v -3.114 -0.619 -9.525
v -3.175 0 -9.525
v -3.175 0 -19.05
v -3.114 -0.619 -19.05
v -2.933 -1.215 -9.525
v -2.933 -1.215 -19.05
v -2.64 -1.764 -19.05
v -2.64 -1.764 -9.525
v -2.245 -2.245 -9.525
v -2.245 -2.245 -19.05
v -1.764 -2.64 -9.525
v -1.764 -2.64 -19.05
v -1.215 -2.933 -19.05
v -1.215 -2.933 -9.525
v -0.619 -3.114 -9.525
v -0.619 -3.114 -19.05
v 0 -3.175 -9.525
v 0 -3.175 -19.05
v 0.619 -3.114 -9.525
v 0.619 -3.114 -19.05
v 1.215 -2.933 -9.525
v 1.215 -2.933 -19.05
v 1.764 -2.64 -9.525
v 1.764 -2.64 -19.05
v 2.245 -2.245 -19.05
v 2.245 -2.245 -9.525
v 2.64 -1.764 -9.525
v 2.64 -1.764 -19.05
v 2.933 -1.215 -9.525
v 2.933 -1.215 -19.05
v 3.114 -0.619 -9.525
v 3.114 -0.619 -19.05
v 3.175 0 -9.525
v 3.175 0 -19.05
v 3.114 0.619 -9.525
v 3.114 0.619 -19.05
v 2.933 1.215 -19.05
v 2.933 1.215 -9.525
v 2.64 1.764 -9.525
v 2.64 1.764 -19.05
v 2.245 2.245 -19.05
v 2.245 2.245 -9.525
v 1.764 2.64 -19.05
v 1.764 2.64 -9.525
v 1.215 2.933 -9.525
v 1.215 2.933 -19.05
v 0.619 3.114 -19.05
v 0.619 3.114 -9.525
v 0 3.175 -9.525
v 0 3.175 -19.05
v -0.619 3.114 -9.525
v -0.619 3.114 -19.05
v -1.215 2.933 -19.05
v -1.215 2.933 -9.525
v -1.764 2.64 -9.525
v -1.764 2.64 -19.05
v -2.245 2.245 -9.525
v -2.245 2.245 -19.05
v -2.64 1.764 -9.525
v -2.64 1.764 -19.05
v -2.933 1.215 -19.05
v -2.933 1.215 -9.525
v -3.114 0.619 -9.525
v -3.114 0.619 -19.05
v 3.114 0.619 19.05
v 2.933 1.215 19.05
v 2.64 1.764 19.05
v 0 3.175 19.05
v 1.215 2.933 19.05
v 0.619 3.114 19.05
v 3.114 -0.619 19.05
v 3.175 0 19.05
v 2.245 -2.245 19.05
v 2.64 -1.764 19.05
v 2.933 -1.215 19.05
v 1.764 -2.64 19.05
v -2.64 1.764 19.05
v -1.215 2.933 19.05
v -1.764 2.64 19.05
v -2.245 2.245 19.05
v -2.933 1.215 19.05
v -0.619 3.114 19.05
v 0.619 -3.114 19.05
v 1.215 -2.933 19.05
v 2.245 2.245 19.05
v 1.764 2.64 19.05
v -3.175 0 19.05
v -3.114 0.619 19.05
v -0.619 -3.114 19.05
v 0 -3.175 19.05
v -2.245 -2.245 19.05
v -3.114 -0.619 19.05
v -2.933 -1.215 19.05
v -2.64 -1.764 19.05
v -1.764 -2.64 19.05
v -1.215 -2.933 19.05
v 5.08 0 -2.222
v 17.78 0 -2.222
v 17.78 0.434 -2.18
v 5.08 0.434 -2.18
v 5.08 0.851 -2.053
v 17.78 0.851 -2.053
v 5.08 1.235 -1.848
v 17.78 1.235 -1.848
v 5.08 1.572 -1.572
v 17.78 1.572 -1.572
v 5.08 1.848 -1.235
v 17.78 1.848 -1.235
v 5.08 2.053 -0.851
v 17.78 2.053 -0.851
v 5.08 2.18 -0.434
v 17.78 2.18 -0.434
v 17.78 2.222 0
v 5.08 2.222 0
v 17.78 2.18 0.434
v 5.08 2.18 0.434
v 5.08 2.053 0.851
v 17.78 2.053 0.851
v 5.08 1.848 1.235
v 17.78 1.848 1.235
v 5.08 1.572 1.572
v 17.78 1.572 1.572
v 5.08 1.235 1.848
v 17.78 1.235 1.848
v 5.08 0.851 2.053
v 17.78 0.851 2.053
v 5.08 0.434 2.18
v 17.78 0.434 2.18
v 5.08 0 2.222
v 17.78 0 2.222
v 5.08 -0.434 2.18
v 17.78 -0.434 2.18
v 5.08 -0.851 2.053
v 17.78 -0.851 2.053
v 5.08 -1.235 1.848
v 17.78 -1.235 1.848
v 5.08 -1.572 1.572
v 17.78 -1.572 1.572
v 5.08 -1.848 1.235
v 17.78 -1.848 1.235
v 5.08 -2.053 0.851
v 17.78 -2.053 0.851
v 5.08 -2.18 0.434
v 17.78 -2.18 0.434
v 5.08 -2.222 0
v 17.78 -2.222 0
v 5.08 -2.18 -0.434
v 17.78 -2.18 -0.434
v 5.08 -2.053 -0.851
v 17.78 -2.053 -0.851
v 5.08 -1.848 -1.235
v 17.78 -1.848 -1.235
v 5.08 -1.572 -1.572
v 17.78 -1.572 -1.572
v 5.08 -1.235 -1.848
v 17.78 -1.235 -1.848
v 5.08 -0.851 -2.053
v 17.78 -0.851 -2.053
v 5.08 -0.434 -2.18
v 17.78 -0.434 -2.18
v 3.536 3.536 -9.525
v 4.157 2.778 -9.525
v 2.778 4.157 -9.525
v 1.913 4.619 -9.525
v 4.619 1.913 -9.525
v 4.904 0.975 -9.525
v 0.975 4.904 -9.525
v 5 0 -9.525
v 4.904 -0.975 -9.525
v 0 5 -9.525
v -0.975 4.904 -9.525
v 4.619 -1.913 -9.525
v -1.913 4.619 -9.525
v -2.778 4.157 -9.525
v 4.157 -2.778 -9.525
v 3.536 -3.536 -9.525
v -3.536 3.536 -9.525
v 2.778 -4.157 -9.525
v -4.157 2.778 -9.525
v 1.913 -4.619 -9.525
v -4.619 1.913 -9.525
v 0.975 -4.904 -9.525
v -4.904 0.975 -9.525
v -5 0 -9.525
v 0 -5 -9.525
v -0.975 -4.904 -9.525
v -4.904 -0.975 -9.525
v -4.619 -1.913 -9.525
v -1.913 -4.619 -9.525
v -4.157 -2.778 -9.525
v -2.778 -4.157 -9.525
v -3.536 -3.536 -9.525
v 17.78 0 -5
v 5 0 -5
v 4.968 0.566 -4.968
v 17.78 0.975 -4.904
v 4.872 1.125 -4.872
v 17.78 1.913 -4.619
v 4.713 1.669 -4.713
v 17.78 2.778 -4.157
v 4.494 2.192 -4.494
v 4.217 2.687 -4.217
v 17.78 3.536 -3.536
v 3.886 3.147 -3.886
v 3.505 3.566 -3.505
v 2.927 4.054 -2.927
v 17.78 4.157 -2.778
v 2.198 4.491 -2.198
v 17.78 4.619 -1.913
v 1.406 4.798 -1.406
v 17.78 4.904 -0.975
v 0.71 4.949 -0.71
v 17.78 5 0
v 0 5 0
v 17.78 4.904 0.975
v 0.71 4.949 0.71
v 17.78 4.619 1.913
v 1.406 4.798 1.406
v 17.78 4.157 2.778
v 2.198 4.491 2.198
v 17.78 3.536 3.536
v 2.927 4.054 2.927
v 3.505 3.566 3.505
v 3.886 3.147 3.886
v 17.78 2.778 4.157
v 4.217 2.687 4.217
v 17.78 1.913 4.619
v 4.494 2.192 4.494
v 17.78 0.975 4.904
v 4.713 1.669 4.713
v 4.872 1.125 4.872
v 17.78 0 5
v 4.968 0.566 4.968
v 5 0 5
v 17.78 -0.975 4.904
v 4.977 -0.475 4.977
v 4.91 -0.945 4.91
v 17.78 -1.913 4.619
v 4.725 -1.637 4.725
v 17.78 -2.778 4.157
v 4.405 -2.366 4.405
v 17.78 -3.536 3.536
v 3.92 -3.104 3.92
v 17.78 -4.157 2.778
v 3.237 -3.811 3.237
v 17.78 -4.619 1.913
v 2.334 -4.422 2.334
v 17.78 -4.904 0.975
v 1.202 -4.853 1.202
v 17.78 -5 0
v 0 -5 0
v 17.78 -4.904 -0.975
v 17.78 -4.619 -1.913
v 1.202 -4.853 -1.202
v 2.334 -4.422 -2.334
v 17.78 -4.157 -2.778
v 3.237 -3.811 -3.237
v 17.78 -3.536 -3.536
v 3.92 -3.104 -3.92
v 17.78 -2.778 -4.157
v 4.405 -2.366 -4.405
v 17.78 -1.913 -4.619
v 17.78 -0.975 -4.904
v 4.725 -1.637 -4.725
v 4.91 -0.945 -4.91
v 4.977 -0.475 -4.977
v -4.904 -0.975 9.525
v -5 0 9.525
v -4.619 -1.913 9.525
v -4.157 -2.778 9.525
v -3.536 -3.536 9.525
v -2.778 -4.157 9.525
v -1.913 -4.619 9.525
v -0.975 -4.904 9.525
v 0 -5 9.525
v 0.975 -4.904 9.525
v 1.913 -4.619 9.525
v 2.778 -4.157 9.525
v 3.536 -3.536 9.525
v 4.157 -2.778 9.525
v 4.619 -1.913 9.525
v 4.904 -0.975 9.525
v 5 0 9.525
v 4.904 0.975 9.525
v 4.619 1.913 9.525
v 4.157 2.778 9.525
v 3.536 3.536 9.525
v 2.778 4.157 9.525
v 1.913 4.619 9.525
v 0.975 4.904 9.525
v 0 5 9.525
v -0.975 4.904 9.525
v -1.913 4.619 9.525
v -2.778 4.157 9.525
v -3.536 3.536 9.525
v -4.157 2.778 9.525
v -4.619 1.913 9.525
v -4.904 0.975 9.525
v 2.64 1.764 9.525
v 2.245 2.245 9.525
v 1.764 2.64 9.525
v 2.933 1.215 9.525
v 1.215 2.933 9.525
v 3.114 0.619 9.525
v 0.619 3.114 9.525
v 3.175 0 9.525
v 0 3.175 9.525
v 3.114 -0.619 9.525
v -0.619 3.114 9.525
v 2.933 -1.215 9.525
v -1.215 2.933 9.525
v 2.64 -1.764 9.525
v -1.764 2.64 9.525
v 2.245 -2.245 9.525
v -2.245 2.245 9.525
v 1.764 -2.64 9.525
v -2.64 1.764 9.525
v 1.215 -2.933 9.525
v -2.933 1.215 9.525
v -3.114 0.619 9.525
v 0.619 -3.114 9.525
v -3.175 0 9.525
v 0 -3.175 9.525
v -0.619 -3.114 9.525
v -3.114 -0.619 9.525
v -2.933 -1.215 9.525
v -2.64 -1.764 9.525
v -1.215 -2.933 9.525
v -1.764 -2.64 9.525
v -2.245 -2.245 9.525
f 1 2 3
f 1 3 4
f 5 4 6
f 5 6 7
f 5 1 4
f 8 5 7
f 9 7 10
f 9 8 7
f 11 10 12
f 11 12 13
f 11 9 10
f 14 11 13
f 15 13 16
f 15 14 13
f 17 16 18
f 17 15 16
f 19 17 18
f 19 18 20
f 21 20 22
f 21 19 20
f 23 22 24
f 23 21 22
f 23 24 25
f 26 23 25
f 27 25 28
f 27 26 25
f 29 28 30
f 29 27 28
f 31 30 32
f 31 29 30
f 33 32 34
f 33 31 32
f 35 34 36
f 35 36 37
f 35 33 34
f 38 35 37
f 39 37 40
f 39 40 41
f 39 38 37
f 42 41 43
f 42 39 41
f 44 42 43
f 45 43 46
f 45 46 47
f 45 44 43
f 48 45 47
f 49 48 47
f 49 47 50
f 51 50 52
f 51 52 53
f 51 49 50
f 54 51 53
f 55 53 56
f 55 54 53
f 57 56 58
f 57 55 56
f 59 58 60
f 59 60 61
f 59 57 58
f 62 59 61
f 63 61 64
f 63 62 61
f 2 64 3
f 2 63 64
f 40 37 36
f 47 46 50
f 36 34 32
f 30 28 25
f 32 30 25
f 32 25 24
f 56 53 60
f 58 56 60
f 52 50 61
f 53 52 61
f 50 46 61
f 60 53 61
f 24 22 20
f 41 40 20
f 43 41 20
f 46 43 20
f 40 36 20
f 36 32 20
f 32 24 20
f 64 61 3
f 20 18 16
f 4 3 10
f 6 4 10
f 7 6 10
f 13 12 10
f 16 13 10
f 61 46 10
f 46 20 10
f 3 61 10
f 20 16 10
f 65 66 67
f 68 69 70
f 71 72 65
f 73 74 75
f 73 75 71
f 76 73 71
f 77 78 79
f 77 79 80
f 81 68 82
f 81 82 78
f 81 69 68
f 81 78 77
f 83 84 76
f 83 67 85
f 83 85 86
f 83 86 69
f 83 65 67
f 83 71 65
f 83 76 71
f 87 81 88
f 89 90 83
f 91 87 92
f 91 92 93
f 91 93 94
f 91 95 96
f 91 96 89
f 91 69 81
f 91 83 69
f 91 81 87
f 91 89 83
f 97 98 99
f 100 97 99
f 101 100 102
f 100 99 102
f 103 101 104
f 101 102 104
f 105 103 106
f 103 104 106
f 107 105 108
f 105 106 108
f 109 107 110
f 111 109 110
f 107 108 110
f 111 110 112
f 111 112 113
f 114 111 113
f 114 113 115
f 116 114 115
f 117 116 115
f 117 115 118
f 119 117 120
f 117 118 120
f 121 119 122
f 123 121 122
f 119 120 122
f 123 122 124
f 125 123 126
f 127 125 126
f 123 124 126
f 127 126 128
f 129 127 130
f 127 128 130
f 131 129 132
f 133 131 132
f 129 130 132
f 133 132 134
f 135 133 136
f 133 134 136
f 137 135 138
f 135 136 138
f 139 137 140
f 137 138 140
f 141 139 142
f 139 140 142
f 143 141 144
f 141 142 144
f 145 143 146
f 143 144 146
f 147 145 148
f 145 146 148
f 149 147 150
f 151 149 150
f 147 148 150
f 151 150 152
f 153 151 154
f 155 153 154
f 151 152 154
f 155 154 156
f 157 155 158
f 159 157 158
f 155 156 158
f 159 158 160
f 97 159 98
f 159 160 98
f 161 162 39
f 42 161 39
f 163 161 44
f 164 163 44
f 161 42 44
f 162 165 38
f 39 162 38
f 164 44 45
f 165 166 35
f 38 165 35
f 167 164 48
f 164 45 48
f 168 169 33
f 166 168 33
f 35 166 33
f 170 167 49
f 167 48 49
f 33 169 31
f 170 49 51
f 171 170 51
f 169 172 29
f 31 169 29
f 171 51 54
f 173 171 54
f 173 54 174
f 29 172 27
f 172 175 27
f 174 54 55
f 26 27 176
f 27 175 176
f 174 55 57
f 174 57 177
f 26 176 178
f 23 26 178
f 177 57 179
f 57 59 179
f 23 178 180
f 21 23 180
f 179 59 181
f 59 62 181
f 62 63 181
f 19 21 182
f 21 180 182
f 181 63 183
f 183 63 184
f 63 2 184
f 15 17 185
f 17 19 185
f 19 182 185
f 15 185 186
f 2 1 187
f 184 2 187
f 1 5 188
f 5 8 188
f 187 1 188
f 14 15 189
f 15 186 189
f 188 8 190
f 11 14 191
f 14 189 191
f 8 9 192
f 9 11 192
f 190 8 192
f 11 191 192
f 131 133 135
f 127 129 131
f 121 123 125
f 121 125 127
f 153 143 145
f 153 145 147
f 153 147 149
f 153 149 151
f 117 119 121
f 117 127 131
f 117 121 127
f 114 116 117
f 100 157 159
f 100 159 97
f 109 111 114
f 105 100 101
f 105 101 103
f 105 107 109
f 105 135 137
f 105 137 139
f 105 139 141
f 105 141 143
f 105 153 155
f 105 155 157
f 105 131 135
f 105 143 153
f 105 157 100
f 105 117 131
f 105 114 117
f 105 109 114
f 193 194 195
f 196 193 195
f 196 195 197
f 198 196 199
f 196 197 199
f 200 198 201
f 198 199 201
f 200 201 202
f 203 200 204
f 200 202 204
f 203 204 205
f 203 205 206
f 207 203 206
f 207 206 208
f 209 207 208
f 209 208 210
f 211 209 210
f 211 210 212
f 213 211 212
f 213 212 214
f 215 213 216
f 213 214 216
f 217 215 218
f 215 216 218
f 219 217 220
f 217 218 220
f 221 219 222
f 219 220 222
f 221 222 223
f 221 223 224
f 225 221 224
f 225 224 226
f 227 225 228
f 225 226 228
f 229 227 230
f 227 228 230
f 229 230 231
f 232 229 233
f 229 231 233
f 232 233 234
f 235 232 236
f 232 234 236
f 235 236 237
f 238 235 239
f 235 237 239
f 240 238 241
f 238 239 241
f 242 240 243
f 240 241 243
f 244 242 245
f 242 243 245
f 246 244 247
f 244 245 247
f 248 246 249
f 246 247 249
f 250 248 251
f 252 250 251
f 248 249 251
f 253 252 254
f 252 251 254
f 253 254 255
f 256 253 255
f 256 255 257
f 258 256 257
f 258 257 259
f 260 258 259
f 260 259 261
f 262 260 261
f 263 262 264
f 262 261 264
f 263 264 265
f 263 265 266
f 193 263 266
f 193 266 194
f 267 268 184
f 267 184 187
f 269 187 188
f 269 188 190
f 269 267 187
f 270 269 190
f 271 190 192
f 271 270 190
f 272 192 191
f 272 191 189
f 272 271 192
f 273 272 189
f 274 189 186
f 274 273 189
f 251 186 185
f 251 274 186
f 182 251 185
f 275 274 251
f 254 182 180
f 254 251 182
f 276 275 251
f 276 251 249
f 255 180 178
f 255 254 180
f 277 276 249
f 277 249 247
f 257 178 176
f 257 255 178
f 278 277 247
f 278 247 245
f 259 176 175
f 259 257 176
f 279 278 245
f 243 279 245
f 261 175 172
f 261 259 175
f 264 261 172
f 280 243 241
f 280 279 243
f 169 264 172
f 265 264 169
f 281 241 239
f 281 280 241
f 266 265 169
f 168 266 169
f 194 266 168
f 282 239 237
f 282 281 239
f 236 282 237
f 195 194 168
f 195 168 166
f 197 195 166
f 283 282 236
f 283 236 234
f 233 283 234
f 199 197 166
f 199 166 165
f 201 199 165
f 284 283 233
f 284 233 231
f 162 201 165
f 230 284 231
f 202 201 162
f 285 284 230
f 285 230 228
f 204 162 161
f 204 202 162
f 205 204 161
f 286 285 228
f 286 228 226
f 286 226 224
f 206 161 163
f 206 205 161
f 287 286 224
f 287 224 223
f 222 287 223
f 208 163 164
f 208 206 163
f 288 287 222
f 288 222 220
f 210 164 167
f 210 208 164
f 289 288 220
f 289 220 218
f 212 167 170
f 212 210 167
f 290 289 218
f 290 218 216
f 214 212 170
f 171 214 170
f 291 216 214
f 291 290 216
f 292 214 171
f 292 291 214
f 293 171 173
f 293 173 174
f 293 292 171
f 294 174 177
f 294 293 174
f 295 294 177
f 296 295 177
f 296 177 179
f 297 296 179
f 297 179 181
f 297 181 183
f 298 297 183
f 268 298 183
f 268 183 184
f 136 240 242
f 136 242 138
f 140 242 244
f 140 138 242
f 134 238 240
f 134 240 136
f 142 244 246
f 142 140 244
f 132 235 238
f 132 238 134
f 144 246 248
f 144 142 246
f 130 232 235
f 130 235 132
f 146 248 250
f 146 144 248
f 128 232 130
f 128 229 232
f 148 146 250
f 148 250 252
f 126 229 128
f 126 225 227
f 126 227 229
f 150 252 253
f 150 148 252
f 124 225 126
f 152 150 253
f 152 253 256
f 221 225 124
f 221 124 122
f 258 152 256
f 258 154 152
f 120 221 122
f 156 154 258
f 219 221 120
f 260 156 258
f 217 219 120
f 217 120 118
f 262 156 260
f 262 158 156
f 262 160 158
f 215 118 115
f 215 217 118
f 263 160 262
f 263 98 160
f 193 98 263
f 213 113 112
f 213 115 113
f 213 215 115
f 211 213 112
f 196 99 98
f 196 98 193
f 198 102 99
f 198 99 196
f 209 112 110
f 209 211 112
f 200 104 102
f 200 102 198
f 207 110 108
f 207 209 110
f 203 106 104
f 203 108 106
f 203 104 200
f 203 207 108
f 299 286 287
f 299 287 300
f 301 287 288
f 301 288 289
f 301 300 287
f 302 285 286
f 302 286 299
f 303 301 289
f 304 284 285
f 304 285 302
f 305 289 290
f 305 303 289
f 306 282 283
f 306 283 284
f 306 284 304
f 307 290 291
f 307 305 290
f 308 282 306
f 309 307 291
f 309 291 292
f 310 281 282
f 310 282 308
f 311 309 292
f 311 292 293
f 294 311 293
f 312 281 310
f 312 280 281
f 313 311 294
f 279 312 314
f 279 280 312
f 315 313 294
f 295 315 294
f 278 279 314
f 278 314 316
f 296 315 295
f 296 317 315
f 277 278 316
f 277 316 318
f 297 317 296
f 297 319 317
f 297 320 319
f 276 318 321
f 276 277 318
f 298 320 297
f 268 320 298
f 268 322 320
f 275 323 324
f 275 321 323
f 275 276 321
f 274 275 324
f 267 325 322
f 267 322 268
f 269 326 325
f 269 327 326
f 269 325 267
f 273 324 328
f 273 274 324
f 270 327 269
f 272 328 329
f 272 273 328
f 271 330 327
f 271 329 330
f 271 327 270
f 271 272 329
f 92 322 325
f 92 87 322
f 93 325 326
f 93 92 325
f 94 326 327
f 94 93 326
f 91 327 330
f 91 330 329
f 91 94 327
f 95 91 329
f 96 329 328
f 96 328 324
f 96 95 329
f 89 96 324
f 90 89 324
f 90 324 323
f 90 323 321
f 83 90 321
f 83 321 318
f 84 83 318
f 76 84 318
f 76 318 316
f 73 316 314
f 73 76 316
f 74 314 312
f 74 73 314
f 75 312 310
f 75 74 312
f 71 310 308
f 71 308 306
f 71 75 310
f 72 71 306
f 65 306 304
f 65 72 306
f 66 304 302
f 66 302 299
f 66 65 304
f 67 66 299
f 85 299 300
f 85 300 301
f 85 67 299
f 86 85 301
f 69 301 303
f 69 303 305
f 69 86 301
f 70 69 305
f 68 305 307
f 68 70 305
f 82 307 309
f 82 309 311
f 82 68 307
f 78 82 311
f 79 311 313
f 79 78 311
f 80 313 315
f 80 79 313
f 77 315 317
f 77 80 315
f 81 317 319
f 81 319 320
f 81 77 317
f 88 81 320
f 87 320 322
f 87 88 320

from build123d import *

# Parameters (mm, degrees)
SKETCH1_R           = 5
BOSS_EXTRUDE1_DEPTH = 9.525
SKETCH5_R           = 3.175
BOSS_EXTRUDE4_DEPTH = 19.05
SKETCH6_R           = 5
BOSS_EXTRUDE5_DEPTH = 17.78
SKETCH7_R           = 2.2225
CUT_EXTRUDE1_DEPTH  = 12.7


with BuildPart() as part:
    # Sketch1 → Boss-Extrude1 (new, symmetric)
    with BuildSketch(Plane.XY):
        with Locations(Location((0, 0, 0), (0, 0, 180))):
            Circle(SKETCH1_R)
    extrude(amount=BOSS_EXTRUDE1_DEPTH, both=True)

    # Sketch5 → Boss-Extrude4 (add, symmetric)
    with BuildSketch(Plane.XY):
        with Locations(Location((0, 0, 0), (0, 0, 180))):
            Circle(SKETCH5_R)
    extrude(amount=BOSS_EXTRUDE4_DEPTH, both=True)

    # Sketch6 → Boss-Extrude5 (add)
    with BuildSketch(Plane(origin=(0, 0, 0), x_dir=(0, 0, -1), z_dir=(1, 0, 0))):
        Circle(SKETCH6_R)
    extrude(amount=BOSS_EXTRUDE5_DEPTH)

    # Sketch7 → Cut-Extrude1 (cut)
    with BuildSketch(Plane(origin=(17.78, 0, 0), x_dir=(0, 0, -1), z_dir=(1, 0, 0))):
        Circle(SKETCH7_R)
    extrude(amount=-CUT_EXTRUDE1_DEPTH, mode=Mode.SUBTRACT)


solid = part.part
